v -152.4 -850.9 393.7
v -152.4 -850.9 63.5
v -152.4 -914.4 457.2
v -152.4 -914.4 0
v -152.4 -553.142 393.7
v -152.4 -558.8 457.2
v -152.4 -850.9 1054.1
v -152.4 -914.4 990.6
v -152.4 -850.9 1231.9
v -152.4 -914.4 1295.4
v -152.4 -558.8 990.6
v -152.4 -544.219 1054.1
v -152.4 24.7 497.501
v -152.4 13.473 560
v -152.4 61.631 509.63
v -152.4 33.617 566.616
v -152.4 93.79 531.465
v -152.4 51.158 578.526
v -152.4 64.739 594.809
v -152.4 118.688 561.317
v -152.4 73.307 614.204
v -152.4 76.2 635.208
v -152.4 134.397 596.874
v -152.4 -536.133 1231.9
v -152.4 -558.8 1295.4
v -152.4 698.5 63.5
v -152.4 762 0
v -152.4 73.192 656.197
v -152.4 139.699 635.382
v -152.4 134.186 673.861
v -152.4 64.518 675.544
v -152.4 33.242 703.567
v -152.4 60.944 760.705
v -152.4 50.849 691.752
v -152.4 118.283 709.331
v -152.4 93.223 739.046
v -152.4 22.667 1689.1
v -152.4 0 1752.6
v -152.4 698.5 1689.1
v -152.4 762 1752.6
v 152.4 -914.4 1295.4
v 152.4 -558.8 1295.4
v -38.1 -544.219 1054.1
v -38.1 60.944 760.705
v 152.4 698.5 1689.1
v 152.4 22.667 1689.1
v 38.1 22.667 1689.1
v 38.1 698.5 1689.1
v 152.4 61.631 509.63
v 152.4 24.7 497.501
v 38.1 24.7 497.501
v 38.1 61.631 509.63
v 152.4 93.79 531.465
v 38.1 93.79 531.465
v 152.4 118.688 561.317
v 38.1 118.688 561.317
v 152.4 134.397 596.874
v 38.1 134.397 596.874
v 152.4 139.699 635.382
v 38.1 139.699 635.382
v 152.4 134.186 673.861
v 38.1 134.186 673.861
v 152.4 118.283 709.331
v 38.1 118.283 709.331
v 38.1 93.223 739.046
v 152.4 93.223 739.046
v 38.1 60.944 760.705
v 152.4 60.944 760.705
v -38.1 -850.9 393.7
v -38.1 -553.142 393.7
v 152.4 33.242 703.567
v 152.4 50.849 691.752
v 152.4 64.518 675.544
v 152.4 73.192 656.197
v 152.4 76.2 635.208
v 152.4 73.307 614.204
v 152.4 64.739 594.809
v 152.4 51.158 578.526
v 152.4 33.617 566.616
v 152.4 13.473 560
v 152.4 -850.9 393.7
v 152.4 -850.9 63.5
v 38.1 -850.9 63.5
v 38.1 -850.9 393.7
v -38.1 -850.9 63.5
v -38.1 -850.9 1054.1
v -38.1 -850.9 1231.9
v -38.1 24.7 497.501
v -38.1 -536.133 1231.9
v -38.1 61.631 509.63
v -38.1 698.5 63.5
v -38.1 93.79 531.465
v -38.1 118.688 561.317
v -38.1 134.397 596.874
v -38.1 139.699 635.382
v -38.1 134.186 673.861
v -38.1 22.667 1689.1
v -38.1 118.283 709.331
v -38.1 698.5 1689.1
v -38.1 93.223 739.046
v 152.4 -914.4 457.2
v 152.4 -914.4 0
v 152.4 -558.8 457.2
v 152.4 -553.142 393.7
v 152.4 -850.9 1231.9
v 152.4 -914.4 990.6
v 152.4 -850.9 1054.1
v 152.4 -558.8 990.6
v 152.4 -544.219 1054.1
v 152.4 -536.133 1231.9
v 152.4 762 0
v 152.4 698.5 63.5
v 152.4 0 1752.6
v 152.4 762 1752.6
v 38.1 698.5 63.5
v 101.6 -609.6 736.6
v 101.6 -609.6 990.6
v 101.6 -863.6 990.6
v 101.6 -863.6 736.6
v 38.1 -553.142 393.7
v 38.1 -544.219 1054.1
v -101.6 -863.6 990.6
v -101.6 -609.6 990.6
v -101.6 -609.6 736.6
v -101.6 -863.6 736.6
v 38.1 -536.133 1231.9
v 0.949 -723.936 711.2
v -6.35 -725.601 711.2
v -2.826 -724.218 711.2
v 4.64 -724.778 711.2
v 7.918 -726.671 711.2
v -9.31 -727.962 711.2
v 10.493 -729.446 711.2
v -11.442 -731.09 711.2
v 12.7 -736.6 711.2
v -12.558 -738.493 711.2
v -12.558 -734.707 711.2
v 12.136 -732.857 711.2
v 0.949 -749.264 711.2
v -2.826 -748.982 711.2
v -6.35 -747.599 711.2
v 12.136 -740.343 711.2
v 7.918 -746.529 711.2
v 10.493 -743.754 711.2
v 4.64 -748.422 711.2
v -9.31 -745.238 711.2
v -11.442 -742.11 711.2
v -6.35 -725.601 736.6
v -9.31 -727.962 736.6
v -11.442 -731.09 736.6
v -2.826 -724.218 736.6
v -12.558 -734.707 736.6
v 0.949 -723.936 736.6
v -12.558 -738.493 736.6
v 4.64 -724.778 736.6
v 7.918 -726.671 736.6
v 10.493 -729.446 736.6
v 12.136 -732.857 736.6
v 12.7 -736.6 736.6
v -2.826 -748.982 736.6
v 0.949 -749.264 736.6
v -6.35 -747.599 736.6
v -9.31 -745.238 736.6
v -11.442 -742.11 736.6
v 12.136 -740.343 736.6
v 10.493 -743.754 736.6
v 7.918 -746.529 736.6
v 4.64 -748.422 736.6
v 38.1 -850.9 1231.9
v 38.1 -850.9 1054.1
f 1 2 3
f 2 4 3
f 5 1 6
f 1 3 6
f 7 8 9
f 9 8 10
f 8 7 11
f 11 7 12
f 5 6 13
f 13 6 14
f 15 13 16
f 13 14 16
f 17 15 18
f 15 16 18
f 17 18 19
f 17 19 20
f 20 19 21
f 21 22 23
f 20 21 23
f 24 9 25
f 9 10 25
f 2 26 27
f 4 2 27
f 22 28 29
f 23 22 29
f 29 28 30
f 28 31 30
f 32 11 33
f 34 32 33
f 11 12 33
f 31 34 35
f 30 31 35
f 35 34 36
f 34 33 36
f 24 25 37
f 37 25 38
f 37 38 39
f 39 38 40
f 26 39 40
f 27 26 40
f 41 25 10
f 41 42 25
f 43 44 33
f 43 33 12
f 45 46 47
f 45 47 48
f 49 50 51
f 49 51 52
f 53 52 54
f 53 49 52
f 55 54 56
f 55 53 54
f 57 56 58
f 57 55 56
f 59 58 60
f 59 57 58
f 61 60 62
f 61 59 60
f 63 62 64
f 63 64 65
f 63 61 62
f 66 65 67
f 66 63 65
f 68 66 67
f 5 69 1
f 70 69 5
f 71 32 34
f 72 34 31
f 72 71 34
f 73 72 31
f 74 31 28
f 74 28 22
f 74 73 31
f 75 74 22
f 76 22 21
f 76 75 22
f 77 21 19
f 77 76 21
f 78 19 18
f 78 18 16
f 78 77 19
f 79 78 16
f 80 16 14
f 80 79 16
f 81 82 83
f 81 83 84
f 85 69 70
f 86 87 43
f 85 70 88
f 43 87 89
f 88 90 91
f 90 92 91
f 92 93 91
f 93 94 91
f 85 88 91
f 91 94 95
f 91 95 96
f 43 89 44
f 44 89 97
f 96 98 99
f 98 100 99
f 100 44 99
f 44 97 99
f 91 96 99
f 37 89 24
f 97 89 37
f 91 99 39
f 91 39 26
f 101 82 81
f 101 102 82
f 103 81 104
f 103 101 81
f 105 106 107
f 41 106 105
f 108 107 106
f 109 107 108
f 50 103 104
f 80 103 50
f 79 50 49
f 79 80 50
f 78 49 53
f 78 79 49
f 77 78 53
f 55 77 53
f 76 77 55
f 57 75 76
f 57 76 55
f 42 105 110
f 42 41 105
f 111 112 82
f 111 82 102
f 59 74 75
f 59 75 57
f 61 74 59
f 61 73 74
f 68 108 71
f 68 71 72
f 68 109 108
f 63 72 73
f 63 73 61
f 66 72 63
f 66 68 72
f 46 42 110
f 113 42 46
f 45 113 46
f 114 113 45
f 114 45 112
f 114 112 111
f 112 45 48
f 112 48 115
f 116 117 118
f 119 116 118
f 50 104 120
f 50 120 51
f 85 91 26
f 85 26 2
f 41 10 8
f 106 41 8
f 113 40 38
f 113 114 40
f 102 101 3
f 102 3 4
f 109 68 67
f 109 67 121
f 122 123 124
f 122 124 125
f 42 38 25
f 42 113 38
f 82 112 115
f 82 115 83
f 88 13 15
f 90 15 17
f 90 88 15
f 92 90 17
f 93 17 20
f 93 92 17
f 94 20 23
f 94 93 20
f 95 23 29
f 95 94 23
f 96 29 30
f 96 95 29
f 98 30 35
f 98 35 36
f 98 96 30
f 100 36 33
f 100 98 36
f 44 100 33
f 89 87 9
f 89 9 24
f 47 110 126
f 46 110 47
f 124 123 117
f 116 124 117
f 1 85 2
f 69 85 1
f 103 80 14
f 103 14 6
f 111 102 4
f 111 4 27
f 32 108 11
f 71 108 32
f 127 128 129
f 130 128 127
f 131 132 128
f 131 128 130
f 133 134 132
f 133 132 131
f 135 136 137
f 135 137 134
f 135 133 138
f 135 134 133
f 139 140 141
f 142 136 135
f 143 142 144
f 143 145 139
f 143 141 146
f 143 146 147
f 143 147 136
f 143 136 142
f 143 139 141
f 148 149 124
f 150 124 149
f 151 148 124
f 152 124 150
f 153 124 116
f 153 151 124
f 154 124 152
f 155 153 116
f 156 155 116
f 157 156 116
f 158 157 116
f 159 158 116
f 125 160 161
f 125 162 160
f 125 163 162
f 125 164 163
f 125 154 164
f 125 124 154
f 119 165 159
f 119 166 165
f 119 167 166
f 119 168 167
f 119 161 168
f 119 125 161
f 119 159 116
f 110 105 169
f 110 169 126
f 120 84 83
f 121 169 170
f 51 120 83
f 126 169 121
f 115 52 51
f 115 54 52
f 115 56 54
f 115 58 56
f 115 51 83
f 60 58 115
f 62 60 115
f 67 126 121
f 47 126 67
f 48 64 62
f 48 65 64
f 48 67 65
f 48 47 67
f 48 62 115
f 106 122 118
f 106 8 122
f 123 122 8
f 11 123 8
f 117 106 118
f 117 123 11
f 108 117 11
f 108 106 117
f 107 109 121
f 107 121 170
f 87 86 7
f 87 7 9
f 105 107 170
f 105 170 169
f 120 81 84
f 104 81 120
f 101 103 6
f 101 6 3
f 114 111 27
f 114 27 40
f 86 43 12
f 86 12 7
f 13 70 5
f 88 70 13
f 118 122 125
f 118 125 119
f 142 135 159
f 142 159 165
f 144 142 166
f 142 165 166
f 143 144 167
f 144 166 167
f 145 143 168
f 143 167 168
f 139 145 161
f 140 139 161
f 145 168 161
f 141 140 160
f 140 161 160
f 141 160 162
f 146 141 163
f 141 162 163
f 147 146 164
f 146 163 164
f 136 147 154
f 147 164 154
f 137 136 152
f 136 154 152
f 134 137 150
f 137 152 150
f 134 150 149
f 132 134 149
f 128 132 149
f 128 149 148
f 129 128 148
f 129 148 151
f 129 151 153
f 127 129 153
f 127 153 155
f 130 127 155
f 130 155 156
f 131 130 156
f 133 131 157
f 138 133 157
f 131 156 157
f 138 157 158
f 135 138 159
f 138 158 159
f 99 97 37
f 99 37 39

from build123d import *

# Parameters (mm, degrees)
F1_DEPTH = 38.1
F3_DEPTH = 152.4
F5_W     = 203.2
F5_H     = 254
F6_DEPTH = 254
F7_R     = 12.7
F8_DEPTH = 25.4


with BuildPart() as f1:
    # F0 (on Right) → F1 (new body, symmetric)
    with BuildSketch(Plane.YZ):
        with BuildLine():
            ThreePointArc((33.242401, 703.56663), (75.487635, 624.604952), (13.472578, 560.000469))
            Line((13.472578, 560.000469), (-558.8, 457.2))
            Line((-558.8, 457.2), (-914.4, 457.2))
            Line((-914.4, 457.2), (-914.4, 0))
            Line((-914.4, 0), (762, 0))
            Line((762, 0), (762, 1752.6))
            Line((762, 1752.6), (0, 1752.6))
            Line((0, 1752.6), (-558.8, 1295.4))
            Line((-558.8, 1295.4), (-914.4, 1295.4))
            Line((-914.4, 1295.4), (-914.4, 990.6))
            Line((-914.4, 990.6), (-558.8, 990.6))
            Line((-558.8, 990.6), (33.242401, 703.56663))
        make_face()
    extrude(amount=F1_DEPTH, both=True)


with BuildPart() as f3:
    # F2 (on Right) → F3 (new body, symmetric)
    with BuildSketch(Plane.YZ):
        with BuildLine():
            Line((-558.8, 990.6), (33.242401, 703.56663))
            ThreePointArc((33.242401, 703.56663), (75.487635, 624.604952), (13.472578, 560.000469))
            Line((13.472578, 560.000469), (-558.8, 457.2))
            Line((-558.8, 457.2), (-914.4, 457.2))
            Line((-914.4, 457.2), (-914.4, 0))
            Line((-914.4, 0), (762, 0))
            Line((762, 0), (762, 1752.6))
            Line((762, 1752.6), (0, 1752.6))
            Line((0, 1752.6), (-558.8, 1295.4))
            Line((-558.8, 1295.4), (-914.4, 1295.4))
            Line((-914.4, 1295.4), (-914.4, 990.6))
            Line((-914.4, 990.6), (-558.8, 990.6))
        make_face()
        with BuildLine():
            Line((698.5, 1689.1), (698.5, 63.5))
            Line((698.5, 63.5), (-850.9, 63.5))
            Line((-850.9, 63.5), (-850.9, 393.7))
            Line((-850.9, 393.7), (-553.141856, 393.7))
            Line((-553.141856, 393.7), (24.699726, 497.50086))
            ThreePointArc((24.699726, 497.50086), (138.393997, 615.942412), (60.944402, 760.705489))
            Line((60.944402, 760.705489), (-544.218653, 1054.1))
            Line((-544.218653, 1054.1), (-850.9, 1054.1))
            Line((-850.9, 1054.1), (-850.9, 1231.9))
            Line((-850.9, 1231.9), (-536.132825, 1231.9))
            Line((-536.132825, 1231.9), (22.667175, 1689.1))
            Line((22.667175, 1689.1), (698.5, 1689.1))
        make_face(mode=Mode.SUBTRACT)
    extrude(amount=F3_DEPTH, both=True)


with BuildPart() as f1_1:
    add(f1.part)

    # F4: union F3
    add(f3.part)

    # F5 (on face) → F6 (join)
    with BuildSketch(Plane(origin=(0, 0, 990.6), x_dir=(1, 0, 0), z_dir=(0, 0, -1))):
        with Locations((0, 736.6)):
            Rectangle(F5_W, F5_H)
    extrude(amount=F6_DEPTH)

    # F7 (on face) → F8 (join)
    with BuildSketch(Plane(origin=(0, 0, 736.6), x_dir=(1, 0, 0), z_dir=(0, 0, -1))):
        with Locations((0, 736.6)):
            Circle(F7_R)
    extrude(amount=F8_DEPTH)


solid = f1_1.part
